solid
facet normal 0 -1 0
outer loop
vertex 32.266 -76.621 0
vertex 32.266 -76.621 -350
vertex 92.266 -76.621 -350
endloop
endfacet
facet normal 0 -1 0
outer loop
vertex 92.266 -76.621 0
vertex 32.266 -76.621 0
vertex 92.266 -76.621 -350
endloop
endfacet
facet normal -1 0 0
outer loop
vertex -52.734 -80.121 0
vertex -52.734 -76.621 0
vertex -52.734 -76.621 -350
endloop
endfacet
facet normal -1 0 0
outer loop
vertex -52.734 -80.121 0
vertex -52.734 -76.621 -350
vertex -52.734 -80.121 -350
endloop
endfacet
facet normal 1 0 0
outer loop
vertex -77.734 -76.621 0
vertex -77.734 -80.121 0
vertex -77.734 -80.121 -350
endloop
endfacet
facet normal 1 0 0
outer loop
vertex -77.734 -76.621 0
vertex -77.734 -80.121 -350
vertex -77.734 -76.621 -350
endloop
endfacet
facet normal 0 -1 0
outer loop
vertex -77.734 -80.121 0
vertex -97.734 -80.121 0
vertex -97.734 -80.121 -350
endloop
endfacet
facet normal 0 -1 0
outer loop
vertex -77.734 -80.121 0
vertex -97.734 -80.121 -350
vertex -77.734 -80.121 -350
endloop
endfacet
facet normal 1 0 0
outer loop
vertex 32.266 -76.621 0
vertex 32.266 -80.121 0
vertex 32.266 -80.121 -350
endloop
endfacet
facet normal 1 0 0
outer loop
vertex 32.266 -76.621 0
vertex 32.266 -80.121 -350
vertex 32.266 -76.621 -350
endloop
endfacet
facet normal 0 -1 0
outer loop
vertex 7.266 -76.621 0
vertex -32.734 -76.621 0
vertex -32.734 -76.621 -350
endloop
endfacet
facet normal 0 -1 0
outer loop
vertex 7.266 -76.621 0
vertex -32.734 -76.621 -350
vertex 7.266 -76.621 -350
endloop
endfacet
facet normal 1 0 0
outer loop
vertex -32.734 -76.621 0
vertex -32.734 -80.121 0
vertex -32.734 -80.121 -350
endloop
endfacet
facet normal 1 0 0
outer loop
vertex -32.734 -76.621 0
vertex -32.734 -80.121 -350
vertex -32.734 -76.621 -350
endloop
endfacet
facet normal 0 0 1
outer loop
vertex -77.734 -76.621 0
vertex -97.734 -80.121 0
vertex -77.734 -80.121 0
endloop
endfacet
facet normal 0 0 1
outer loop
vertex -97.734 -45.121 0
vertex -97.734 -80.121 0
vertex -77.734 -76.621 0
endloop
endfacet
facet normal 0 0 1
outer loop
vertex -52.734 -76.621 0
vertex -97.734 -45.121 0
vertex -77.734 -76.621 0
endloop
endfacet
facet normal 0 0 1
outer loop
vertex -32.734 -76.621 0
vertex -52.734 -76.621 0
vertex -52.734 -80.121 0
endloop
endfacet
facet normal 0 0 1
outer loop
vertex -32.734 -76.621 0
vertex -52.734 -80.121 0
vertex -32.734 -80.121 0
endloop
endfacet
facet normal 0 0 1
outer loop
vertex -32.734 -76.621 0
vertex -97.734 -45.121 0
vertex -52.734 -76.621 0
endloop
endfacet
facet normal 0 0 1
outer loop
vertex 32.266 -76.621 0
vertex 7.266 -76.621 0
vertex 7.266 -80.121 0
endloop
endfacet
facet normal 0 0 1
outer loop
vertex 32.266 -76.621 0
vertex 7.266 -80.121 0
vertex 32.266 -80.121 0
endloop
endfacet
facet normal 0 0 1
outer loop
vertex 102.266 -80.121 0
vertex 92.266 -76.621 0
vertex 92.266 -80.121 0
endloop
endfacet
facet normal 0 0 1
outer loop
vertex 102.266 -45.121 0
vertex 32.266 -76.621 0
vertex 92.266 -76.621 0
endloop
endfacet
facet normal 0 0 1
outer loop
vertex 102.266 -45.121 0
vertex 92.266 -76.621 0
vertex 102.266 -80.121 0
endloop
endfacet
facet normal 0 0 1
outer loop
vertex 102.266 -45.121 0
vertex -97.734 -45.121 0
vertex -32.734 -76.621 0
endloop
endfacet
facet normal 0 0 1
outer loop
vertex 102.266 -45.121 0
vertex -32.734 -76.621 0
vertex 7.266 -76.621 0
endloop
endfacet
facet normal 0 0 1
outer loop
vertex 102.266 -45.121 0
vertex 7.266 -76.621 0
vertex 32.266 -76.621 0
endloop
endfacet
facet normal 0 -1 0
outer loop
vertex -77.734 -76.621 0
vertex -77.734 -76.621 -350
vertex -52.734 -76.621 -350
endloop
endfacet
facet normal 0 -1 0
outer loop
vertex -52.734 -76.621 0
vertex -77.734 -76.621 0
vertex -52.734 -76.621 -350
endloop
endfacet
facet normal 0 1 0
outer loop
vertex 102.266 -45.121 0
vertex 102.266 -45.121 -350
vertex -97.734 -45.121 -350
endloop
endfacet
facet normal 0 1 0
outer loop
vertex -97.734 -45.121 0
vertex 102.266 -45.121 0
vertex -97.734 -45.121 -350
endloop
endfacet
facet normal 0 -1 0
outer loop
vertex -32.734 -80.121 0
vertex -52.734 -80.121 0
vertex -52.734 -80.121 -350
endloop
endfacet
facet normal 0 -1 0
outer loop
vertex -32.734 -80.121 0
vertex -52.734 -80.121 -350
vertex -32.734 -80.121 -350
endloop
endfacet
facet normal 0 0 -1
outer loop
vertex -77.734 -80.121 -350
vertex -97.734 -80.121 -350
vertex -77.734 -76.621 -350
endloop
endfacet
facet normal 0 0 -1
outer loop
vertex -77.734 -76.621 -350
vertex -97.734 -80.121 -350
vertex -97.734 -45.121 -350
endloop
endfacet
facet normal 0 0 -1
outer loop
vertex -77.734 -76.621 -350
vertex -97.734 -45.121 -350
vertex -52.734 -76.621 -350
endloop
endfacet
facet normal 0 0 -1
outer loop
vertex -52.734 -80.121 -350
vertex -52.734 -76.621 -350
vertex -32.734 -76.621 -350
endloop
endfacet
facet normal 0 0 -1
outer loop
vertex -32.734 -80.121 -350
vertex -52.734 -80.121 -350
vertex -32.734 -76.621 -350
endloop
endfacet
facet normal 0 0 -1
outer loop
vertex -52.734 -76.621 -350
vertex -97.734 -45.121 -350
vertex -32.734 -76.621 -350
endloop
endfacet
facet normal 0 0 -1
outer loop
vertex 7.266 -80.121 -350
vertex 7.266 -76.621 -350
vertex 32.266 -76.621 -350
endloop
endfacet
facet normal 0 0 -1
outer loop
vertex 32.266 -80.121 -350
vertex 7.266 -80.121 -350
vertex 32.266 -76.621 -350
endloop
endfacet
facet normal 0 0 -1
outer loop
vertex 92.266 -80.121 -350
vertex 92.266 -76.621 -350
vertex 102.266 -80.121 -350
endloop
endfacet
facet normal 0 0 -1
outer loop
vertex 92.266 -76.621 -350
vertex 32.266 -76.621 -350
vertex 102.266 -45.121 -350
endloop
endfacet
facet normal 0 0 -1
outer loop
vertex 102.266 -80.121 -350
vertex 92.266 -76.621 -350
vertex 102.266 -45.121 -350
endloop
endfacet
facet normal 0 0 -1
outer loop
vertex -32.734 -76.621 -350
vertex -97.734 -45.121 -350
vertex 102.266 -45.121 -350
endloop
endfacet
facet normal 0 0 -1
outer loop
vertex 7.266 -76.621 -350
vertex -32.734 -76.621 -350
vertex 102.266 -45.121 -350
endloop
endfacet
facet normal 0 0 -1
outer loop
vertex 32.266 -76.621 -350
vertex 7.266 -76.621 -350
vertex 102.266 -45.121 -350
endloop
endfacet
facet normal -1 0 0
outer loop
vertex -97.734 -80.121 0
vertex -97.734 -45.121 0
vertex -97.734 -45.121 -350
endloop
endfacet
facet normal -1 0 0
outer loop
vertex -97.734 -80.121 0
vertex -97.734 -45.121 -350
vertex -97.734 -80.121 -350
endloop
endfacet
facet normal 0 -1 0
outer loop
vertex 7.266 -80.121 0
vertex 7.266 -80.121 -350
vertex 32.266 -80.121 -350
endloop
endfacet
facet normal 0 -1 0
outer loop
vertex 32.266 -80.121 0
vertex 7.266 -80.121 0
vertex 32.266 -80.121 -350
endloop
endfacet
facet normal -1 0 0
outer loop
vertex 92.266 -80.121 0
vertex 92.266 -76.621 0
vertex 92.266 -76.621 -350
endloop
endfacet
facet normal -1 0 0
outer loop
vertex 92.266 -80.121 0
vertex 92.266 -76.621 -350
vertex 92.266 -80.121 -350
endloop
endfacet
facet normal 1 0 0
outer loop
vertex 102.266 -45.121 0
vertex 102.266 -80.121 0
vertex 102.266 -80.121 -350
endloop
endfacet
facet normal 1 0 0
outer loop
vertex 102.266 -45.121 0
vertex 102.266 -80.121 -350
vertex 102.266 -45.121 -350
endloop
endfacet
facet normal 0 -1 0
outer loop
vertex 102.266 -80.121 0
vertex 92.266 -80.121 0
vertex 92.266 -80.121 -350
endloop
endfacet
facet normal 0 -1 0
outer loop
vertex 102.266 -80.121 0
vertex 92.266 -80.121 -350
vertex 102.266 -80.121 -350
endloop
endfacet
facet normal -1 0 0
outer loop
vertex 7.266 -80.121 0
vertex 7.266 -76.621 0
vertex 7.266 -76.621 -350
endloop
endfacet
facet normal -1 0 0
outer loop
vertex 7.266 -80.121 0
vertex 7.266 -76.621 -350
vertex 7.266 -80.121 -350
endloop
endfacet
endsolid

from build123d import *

# Parameters (mm, degrees)
F1_DEPTH = 350


with BuildPart() as f1:
    # F0 (on Top) → F1 (new body)
    with BuildSketch(Plane.XY):
        Polygon((102.266435, -45.12095), (-97.733565, -45.12095), (-97.733565, -80.12095), (-77.733565, -80.12095), (-77.733565, -76.62095), (-52.733565, -76.62095), (-52.733565, -80.12095), (-32.733565, -80.12095), (-32.733565, -76.62095), (7.266435, -76.62095), (7.266435, -80.12095), (32.266435, -80.12095), (32.266435, -76.62095), (92.266435, -76.62095), (92.266435, -80.12095), (102.266435, -80.12095), align=None)
    extrude(amount=-F1_DEPTH)


solid = f1.part
